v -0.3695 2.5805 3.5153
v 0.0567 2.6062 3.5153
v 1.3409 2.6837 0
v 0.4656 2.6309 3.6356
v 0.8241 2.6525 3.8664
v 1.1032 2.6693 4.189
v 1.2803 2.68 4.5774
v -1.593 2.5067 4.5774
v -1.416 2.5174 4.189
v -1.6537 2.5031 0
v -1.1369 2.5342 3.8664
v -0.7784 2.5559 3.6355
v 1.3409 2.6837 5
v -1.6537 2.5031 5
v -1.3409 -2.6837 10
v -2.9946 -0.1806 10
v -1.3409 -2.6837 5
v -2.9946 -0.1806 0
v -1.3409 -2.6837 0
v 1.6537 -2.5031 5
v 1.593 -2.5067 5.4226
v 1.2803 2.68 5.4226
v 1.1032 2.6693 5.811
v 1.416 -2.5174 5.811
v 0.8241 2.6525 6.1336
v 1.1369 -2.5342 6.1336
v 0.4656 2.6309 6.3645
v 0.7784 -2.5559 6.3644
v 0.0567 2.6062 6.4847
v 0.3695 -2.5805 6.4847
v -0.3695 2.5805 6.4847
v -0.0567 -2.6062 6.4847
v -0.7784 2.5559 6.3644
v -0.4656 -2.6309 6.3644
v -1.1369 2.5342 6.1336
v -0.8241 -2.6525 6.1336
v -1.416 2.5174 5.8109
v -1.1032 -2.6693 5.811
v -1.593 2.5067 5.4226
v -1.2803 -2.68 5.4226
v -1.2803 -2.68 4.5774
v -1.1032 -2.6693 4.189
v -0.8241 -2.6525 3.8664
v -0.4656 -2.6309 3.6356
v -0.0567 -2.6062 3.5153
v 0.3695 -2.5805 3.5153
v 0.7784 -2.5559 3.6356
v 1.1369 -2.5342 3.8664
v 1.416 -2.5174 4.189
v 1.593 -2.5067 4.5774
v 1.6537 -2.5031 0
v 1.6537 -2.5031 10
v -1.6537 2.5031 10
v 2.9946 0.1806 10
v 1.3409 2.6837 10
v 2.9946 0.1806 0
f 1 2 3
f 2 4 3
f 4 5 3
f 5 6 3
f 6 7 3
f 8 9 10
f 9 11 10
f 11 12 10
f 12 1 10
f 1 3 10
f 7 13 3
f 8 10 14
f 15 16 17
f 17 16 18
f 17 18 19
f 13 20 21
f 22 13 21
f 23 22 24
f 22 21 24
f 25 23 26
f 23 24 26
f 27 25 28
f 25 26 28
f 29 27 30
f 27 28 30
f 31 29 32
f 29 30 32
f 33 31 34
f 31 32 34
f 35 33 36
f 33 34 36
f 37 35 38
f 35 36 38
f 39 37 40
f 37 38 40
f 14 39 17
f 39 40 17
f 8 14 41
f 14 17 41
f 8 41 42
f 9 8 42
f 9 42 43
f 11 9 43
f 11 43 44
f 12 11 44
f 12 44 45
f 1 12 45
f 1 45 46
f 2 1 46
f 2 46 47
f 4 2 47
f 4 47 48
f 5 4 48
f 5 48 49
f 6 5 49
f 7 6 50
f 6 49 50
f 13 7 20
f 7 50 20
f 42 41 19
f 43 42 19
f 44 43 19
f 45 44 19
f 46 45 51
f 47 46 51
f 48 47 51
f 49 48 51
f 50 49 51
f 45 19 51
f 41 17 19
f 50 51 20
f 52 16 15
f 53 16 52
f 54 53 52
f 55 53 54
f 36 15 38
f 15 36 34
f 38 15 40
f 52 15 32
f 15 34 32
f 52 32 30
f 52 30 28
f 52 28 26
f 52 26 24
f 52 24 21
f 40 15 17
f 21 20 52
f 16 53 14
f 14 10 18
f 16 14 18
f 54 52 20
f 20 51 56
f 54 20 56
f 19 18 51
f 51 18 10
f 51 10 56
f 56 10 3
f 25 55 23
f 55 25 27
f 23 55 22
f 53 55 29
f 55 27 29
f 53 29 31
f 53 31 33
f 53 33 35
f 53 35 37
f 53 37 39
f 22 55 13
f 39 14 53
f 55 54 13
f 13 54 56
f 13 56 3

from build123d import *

# Parameters (mm, degrees)
F1_DEPTH = 10
F3_DEPTH = 5.1961524227


with BuildPart() as f1:
    # F0 (on Top) → F1 (new body)
    with BuildSketch(Plane.XY):
        Polygon((-1.3409011788, -2.6836512495), (1.6536595675, -2.5030801095), (2.9945607463, 0.18057114), (1.3409011788, 2.6836512495), (-1.6536595675, 2.5030801095), (-2.9945607463, -0.18057114), align=None)
    extrude(amount=F1_DEPTH)

    # F2 (on face) → F3 (cut, through all)
    with BuildSketch(Plane(origin=(0.1563791944, -2.5933656795, 0), x_dir=(0.9981869154, 0.06019038, 0), z_dir=(0.06019038, -0.9981869154, 0))):
        with BuildLine():
            ThreePointArc((-1.5, 5), (0, 3.5), (1.5, 5))
            ThreePointArc((1.5, 5), (0, 6.5), (-1.5, 5))
        make_face()
    extrude(amount=-F3_DEPTH, mode=Mode.SUBTRACT)


solid = f1.part
